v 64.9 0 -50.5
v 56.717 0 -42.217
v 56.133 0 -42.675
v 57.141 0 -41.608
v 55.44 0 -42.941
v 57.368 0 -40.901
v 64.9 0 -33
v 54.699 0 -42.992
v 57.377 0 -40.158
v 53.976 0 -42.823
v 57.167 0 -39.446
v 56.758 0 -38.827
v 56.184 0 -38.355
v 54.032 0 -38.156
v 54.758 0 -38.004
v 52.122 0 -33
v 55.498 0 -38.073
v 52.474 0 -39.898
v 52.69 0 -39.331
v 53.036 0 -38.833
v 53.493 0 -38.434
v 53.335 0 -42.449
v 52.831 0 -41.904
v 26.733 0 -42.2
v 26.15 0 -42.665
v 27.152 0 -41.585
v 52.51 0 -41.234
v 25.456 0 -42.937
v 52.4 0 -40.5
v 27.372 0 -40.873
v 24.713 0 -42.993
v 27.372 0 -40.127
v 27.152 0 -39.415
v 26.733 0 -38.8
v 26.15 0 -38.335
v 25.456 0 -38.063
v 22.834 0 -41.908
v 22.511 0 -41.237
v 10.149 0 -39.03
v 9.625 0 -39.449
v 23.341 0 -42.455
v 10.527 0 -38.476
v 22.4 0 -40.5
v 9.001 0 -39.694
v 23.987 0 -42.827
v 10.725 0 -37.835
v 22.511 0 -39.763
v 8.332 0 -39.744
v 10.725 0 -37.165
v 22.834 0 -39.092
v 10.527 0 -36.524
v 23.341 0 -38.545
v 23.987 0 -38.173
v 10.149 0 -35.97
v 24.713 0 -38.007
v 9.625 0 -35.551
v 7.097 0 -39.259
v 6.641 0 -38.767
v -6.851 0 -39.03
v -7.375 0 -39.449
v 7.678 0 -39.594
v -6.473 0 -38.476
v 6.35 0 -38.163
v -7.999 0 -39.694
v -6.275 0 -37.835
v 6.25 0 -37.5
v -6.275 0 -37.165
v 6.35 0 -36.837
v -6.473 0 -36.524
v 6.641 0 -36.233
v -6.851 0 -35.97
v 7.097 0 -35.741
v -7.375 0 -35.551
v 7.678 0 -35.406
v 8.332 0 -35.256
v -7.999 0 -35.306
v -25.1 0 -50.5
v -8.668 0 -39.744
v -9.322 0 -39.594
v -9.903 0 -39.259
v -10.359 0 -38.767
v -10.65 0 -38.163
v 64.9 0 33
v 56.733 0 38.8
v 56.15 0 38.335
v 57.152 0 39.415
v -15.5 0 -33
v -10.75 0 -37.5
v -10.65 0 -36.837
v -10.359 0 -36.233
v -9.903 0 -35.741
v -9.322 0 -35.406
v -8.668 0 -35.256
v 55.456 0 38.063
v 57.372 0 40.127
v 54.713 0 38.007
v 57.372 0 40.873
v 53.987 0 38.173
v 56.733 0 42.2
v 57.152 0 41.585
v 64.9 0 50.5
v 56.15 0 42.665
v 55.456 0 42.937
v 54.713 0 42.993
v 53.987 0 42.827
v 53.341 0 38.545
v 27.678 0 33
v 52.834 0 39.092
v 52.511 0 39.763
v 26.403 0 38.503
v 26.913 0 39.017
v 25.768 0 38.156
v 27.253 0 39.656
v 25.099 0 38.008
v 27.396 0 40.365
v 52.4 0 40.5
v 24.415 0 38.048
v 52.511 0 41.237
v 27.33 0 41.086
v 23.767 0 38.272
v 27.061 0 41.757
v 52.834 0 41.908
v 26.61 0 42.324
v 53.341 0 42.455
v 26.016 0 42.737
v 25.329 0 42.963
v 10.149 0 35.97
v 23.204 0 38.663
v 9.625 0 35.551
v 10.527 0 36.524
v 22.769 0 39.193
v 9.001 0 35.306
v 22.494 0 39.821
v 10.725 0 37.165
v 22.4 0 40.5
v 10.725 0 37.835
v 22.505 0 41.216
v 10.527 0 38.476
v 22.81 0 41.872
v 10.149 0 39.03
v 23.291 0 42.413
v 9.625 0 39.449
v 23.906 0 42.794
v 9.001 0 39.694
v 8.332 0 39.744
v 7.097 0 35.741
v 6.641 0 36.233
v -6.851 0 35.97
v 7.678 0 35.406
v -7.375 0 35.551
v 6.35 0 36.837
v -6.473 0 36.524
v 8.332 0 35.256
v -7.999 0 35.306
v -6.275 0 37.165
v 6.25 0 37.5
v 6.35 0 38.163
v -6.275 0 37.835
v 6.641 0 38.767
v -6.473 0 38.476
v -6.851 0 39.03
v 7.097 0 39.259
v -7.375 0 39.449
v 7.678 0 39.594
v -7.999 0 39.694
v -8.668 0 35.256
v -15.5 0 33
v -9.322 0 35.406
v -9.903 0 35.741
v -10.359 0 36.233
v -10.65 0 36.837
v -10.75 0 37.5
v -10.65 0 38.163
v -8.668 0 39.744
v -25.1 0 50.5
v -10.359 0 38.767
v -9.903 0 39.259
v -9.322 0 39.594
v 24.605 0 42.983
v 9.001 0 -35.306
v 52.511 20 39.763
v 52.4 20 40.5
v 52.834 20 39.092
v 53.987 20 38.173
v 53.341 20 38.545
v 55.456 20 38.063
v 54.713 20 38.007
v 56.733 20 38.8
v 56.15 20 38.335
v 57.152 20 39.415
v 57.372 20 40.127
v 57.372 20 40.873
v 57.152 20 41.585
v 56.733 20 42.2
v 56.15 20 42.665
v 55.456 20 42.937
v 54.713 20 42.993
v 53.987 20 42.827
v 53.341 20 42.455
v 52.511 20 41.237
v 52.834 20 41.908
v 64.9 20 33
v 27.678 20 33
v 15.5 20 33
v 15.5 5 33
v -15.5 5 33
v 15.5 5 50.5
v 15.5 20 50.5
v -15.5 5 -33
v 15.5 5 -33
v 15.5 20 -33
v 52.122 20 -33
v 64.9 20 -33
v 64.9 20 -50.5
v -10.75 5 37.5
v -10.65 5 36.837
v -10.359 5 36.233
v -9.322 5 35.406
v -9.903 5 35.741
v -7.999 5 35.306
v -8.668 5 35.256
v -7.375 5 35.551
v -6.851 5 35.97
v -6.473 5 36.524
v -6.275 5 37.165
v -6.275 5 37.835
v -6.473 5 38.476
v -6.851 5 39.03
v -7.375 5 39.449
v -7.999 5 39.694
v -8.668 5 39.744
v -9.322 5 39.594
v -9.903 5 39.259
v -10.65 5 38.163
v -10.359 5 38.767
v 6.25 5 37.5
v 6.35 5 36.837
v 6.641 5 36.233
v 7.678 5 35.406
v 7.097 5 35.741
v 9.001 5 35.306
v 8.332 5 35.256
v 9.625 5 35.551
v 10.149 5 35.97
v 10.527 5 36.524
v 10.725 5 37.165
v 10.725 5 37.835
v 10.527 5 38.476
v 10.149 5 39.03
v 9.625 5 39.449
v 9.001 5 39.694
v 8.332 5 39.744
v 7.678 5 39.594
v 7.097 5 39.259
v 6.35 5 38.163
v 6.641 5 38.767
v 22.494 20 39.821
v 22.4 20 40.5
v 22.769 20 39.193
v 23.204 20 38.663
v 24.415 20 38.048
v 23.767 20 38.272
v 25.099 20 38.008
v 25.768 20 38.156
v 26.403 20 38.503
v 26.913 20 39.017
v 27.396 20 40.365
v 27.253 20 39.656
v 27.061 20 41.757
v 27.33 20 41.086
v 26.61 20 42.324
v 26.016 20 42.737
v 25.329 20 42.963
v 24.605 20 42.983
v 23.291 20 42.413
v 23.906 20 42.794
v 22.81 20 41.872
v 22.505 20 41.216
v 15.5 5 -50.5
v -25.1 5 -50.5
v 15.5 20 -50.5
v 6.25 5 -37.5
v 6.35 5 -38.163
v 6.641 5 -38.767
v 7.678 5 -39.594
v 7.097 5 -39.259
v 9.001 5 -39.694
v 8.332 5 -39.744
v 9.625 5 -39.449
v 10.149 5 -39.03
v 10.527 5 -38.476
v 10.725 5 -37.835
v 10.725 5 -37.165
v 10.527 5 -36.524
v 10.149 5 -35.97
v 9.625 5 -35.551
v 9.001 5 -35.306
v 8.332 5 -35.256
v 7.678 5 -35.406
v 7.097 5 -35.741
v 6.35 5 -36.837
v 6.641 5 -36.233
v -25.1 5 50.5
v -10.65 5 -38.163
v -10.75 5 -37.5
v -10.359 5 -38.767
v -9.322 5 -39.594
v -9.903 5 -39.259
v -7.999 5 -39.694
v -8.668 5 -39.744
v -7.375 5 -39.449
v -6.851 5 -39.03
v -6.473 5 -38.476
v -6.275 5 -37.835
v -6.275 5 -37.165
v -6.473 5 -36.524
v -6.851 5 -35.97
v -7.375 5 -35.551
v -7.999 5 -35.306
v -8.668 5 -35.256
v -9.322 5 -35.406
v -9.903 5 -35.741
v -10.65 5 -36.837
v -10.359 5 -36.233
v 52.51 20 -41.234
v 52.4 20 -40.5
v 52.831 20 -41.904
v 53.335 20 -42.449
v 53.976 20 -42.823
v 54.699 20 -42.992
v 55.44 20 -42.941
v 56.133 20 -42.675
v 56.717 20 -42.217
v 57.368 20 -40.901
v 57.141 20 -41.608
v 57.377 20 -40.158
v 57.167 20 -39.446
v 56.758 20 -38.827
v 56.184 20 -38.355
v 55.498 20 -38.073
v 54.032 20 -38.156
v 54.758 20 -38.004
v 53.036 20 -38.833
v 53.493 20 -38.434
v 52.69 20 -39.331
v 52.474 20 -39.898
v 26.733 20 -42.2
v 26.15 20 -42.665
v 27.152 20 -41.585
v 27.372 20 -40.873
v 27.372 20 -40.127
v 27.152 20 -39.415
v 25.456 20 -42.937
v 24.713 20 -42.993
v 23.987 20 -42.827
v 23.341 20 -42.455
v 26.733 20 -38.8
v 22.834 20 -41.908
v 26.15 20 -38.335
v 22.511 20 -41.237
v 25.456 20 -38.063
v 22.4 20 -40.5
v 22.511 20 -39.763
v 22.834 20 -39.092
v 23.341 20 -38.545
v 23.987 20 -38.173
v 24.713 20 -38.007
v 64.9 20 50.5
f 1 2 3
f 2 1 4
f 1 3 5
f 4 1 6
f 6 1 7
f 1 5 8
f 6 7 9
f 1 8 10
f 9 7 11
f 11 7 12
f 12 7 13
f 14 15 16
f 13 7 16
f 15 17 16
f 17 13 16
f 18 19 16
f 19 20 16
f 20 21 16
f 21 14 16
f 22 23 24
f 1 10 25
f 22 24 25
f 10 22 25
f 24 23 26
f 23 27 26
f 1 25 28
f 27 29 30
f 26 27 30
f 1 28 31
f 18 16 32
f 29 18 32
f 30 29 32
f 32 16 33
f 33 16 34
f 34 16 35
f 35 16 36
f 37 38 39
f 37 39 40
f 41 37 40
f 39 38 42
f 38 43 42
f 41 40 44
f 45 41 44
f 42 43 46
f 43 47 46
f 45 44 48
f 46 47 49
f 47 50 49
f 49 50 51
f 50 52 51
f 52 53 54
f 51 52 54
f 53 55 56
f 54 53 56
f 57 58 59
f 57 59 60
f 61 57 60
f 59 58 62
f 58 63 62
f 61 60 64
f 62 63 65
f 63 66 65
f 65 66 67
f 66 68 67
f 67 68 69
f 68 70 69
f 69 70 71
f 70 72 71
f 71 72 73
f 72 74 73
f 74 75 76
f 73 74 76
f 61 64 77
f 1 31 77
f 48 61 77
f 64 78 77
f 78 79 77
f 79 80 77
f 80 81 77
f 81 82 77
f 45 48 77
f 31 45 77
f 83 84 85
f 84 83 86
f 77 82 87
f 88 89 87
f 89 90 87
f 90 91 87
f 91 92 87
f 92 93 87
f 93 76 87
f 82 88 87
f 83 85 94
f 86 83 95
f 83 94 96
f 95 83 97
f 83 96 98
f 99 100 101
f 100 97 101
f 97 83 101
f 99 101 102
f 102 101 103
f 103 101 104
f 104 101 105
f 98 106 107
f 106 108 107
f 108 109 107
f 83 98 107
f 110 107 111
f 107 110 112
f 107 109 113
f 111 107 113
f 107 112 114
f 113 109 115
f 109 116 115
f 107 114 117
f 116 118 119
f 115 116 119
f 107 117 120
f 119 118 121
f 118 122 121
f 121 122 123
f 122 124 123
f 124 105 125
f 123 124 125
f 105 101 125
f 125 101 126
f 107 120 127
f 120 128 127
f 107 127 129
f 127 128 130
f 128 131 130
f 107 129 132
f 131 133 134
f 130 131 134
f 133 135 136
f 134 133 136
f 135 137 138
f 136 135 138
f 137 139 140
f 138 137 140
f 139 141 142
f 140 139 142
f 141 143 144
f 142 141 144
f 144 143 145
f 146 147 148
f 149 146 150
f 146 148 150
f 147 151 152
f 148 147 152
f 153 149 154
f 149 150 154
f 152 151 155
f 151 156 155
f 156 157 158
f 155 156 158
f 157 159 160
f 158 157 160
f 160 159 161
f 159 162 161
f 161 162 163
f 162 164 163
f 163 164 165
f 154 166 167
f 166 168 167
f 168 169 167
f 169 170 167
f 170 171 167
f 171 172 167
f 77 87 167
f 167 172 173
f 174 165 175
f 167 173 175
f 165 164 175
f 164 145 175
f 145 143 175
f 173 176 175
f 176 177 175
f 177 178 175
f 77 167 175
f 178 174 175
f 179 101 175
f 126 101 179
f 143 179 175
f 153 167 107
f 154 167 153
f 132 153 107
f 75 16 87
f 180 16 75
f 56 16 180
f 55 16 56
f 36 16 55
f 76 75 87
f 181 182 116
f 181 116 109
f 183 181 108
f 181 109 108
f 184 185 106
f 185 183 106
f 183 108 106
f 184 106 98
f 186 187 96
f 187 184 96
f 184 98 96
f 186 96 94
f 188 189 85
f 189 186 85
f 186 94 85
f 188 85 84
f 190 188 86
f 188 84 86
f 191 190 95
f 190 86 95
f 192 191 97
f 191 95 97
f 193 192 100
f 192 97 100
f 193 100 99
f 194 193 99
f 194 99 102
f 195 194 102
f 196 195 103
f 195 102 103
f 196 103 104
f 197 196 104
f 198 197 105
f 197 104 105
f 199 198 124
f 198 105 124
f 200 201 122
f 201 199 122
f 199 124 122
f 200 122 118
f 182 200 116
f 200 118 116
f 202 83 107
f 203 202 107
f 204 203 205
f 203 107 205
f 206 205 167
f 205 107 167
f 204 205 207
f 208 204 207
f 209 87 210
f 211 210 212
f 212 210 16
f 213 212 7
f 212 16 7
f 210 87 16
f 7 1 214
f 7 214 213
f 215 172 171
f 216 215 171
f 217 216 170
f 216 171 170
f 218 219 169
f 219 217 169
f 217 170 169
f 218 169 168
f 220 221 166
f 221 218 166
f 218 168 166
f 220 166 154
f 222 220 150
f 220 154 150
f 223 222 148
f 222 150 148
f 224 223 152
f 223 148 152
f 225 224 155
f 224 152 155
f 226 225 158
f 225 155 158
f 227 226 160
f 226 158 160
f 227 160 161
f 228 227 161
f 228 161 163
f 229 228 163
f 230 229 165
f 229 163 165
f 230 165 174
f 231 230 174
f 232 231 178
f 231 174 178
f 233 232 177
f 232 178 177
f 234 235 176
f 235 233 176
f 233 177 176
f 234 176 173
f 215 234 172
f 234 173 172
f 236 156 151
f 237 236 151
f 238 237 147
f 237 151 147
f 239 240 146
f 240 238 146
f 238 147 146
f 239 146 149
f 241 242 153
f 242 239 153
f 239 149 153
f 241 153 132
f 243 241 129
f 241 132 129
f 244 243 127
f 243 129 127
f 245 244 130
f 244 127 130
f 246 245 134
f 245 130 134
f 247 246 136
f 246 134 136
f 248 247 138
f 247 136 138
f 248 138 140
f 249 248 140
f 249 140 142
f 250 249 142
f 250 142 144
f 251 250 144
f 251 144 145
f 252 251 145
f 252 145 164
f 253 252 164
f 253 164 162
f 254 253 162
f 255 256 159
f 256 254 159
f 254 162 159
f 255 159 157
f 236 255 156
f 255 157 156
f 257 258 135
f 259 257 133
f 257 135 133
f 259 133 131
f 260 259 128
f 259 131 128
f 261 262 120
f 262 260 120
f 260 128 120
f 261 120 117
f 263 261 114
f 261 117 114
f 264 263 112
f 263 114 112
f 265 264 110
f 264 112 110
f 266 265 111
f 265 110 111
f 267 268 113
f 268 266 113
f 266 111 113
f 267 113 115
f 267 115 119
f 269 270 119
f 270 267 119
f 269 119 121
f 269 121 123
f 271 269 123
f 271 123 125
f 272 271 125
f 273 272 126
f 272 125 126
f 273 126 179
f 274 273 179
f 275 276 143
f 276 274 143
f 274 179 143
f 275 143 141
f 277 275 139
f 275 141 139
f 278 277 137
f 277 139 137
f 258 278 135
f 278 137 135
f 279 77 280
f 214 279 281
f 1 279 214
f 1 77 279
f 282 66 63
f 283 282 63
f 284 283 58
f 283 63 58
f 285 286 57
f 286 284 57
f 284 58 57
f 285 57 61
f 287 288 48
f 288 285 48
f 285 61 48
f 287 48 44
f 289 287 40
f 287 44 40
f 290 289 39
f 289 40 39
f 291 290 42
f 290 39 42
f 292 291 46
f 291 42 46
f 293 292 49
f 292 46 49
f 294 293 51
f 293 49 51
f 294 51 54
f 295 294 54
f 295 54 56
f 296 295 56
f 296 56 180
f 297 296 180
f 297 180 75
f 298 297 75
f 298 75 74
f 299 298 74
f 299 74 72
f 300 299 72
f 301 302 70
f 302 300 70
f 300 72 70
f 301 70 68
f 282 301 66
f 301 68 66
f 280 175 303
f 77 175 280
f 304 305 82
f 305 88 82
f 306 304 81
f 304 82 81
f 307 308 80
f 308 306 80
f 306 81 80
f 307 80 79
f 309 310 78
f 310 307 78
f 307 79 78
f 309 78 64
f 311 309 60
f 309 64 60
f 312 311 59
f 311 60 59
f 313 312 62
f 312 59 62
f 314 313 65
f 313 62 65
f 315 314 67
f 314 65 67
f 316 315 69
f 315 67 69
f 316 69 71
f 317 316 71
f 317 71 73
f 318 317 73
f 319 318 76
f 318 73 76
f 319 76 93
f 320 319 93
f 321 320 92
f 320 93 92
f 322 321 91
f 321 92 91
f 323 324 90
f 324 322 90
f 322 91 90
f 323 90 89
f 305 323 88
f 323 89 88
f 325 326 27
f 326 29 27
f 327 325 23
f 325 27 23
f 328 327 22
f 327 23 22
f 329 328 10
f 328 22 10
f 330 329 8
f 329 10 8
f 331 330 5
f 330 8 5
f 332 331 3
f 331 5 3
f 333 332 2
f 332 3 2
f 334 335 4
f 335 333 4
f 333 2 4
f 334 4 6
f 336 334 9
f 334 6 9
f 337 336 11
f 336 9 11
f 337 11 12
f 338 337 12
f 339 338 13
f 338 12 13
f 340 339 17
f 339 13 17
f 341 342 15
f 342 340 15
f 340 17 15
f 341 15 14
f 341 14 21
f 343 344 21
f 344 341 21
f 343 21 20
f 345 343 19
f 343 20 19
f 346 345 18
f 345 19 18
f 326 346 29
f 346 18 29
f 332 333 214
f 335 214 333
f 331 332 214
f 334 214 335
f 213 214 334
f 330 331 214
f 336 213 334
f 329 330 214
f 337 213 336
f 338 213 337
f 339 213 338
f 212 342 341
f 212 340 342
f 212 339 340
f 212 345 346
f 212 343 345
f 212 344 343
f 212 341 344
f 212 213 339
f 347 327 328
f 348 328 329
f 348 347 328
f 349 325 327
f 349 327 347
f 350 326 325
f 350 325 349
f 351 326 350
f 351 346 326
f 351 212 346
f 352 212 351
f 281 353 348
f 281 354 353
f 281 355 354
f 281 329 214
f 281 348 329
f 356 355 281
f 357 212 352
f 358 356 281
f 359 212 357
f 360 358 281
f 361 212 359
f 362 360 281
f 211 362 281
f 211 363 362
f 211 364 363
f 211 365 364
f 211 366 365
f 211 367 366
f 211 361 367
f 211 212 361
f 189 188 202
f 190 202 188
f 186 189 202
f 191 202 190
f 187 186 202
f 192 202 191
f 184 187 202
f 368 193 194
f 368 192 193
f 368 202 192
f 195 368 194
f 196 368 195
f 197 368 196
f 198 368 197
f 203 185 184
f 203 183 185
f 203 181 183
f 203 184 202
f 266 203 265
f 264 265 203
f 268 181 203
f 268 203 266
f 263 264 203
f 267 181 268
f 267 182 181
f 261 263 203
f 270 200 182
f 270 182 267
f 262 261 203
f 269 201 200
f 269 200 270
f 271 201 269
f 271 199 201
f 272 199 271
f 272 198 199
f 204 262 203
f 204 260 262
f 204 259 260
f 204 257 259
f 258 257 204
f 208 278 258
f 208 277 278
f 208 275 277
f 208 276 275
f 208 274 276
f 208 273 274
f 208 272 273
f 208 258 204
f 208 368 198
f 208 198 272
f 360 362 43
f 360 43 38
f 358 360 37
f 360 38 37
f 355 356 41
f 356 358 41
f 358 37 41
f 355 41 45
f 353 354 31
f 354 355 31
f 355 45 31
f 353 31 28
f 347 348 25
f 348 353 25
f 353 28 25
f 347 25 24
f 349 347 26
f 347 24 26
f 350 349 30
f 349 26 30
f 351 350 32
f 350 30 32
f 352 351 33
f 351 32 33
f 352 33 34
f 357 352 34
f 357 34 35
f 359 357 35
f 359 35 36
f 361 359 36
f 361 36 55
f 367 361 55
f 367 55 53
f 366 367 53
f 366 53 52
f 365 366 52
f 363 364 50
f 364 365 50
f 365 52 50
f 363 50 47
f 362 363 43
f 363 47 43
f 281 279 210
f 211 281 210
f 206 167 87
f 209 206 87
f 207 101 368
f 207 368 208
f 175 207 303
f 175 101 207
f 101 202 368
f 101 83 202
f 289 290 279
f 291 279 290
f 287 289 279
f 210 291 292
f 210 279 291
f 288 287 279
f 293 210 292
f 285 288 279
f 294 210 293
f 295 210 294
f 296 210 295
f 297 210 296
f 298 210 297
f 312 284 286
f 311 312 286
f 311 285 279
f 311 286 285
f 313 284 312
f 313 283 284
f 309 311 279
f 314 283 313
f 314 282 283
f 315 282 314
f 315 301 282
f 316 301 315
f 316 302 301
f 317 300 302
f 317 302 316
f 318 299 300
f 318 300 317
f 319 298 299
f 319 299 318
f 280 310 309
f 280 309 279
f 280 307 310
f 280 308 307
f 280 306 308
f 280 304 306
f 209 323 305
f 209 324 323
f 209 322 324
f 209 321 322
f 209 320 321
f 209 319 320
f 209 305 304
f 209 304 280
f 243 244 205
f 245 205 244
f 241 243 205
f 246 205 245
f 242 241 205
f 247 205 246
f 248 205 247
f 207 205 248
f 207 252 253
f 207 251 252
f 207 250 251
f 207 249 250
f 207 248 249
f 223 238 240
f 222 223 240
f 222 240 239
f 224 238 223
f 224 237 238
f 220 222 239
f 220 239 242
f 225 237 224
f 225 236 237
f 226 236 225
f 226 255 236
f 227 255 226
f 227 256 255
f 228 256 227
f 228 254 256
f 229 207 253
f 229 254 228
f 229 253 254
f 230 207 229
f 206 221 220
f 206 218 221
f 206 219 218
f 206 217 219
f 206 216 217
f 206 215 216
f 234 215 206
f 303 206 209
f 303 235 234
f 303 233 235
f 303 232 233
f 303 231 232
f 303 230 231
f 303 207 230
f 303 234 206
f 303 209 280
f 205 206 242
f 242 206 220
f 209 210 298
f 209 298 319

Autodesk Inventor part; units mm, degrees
ref_plane "YZ Plane" through (0, 0, 0) normal (1, 0, 0) x (0, 1, 0)
ref_plane "XZ Plane" through (0, 0, 0) normal (0, 1, 0) x (-1, 0, 0)
ref_plane "XY Plane" through (0, 0, 0) normal (0, 0, 1) x (1, 0, 0)
sketch "Sketch1" plane through (0, 0, 0) normal (0, 1, 0) x (-1, 0, 0)
  line L0 (8.5, -37.5) -> (8.5, 37.5) construction
  line L1 (-8.5, 37.5) -> (-8.5, -37.5) construction
  line L2 (15.5, 33) -> (15.5, -33)
  line L3 (-15.5, -33) -> (-15.5, 33) construction
  line L4 (15.5, -33) -> (-15.5, -33)
  line L5 (-8.5, -37.5) -> (8.5, -37.5) construction
  circle A0 centre (8.5, -37.5) radius 2.25
  line L6 (0, -37.5) -> (-8.5, -37.5) construction
  circle A1 centre (-8.5, -37.5) radius 2.25
  line L7 (-15.5, 33) -> (15.5, 33)
  circle A2 centre (-8.5, 37.5) radius 2.25
  line L8 (8.5, 37.5) -> (-8.5, 37.5) construction
  circle A3 centre (8.5, 37.5) radius 2.25
  line L9 (-15.5, -33) -> (15.5, 33) construction
  line L10 (0, 33) -> (0, 19.5) construction
  line L11 (0, 0) -> (15.5, 0) construction
  line L12 (0, 19.5) -> (-39.9, 19.5) construction
  line L13 (-54.9, -40.5) -> (-24.9, -40.5) construction
  circle A4 centre (-54.9, -40.5) radius 2.5
  circle A5 centre (-24.9, -40.5) radius 2.5
  line L14 (-24.9, -40.5) -> (-24.9, -50.5) construction
  line L15 (25.1, 50.5) -> (25.1, -50.5)
  line L16 (25.1, -50.5) -> (-24.9, -50.5)
  line L17 (-15.5, -33) -> (-64.9, -33)
  line L18 (-64.9, -50.5) -> (-24.9, -50.5)
  line L19 (0, 0) -> (-54.9, 0) construction
  line L20 (-54.9, 40.5) -> (-24.9, 40.5) construction
  circle A6 centre (-54.9, 40.5) radius 2.5
  circle A7 centre (-24.9, 40.5) radius 2.5
  line L21 (-24.9, 40.5) -> (-24.9, 50.5) construction
  line L22 (-15.5, 33) -> (-64.9, 33)
  line L23 (-64.9, 50.5) -> (25.1, 50.5)
  line L24 (-24.9, 40.5) -> (-54.9, -40.5)
  circle A8 centre (-39.9, 19.5) radius 3.9303 construction
  line L25 (-15.5, -50.5) -> (-15.5, -33)
  line L26 (-15.5, 33) -> (-15.5, 50.5)
  line L27 (-64.9, -50.5) -> (-64.9, -33)
  line L28 (-64.9, 33) -> (-64.9, 50.5)
  point P0 (0, 0)
  point P1 (8.5, 33)
  dimension "d0" = 8.5
  dimension "d1" = 4.5
  dimension "d2" = 17
  dimension "d3" = 75
  dimension "d4" = 31
  dimension "d9" = 13.5
  dimension "d13" = 39.9
  dimension "d14" = 30
  dimension "d18" = 10
extrude "Extrusion1" add sketch "Sketch1" along normal blind 5 contours L7 L26 L23 L15 L16 L25 L4 L2
extrude "Extrusion2" add sketch "Sketch1" along normal blind 20 contours L22 L28 L23 L26 | L25 L16 L18 L27 L17
properties part number "Servo_fix"
